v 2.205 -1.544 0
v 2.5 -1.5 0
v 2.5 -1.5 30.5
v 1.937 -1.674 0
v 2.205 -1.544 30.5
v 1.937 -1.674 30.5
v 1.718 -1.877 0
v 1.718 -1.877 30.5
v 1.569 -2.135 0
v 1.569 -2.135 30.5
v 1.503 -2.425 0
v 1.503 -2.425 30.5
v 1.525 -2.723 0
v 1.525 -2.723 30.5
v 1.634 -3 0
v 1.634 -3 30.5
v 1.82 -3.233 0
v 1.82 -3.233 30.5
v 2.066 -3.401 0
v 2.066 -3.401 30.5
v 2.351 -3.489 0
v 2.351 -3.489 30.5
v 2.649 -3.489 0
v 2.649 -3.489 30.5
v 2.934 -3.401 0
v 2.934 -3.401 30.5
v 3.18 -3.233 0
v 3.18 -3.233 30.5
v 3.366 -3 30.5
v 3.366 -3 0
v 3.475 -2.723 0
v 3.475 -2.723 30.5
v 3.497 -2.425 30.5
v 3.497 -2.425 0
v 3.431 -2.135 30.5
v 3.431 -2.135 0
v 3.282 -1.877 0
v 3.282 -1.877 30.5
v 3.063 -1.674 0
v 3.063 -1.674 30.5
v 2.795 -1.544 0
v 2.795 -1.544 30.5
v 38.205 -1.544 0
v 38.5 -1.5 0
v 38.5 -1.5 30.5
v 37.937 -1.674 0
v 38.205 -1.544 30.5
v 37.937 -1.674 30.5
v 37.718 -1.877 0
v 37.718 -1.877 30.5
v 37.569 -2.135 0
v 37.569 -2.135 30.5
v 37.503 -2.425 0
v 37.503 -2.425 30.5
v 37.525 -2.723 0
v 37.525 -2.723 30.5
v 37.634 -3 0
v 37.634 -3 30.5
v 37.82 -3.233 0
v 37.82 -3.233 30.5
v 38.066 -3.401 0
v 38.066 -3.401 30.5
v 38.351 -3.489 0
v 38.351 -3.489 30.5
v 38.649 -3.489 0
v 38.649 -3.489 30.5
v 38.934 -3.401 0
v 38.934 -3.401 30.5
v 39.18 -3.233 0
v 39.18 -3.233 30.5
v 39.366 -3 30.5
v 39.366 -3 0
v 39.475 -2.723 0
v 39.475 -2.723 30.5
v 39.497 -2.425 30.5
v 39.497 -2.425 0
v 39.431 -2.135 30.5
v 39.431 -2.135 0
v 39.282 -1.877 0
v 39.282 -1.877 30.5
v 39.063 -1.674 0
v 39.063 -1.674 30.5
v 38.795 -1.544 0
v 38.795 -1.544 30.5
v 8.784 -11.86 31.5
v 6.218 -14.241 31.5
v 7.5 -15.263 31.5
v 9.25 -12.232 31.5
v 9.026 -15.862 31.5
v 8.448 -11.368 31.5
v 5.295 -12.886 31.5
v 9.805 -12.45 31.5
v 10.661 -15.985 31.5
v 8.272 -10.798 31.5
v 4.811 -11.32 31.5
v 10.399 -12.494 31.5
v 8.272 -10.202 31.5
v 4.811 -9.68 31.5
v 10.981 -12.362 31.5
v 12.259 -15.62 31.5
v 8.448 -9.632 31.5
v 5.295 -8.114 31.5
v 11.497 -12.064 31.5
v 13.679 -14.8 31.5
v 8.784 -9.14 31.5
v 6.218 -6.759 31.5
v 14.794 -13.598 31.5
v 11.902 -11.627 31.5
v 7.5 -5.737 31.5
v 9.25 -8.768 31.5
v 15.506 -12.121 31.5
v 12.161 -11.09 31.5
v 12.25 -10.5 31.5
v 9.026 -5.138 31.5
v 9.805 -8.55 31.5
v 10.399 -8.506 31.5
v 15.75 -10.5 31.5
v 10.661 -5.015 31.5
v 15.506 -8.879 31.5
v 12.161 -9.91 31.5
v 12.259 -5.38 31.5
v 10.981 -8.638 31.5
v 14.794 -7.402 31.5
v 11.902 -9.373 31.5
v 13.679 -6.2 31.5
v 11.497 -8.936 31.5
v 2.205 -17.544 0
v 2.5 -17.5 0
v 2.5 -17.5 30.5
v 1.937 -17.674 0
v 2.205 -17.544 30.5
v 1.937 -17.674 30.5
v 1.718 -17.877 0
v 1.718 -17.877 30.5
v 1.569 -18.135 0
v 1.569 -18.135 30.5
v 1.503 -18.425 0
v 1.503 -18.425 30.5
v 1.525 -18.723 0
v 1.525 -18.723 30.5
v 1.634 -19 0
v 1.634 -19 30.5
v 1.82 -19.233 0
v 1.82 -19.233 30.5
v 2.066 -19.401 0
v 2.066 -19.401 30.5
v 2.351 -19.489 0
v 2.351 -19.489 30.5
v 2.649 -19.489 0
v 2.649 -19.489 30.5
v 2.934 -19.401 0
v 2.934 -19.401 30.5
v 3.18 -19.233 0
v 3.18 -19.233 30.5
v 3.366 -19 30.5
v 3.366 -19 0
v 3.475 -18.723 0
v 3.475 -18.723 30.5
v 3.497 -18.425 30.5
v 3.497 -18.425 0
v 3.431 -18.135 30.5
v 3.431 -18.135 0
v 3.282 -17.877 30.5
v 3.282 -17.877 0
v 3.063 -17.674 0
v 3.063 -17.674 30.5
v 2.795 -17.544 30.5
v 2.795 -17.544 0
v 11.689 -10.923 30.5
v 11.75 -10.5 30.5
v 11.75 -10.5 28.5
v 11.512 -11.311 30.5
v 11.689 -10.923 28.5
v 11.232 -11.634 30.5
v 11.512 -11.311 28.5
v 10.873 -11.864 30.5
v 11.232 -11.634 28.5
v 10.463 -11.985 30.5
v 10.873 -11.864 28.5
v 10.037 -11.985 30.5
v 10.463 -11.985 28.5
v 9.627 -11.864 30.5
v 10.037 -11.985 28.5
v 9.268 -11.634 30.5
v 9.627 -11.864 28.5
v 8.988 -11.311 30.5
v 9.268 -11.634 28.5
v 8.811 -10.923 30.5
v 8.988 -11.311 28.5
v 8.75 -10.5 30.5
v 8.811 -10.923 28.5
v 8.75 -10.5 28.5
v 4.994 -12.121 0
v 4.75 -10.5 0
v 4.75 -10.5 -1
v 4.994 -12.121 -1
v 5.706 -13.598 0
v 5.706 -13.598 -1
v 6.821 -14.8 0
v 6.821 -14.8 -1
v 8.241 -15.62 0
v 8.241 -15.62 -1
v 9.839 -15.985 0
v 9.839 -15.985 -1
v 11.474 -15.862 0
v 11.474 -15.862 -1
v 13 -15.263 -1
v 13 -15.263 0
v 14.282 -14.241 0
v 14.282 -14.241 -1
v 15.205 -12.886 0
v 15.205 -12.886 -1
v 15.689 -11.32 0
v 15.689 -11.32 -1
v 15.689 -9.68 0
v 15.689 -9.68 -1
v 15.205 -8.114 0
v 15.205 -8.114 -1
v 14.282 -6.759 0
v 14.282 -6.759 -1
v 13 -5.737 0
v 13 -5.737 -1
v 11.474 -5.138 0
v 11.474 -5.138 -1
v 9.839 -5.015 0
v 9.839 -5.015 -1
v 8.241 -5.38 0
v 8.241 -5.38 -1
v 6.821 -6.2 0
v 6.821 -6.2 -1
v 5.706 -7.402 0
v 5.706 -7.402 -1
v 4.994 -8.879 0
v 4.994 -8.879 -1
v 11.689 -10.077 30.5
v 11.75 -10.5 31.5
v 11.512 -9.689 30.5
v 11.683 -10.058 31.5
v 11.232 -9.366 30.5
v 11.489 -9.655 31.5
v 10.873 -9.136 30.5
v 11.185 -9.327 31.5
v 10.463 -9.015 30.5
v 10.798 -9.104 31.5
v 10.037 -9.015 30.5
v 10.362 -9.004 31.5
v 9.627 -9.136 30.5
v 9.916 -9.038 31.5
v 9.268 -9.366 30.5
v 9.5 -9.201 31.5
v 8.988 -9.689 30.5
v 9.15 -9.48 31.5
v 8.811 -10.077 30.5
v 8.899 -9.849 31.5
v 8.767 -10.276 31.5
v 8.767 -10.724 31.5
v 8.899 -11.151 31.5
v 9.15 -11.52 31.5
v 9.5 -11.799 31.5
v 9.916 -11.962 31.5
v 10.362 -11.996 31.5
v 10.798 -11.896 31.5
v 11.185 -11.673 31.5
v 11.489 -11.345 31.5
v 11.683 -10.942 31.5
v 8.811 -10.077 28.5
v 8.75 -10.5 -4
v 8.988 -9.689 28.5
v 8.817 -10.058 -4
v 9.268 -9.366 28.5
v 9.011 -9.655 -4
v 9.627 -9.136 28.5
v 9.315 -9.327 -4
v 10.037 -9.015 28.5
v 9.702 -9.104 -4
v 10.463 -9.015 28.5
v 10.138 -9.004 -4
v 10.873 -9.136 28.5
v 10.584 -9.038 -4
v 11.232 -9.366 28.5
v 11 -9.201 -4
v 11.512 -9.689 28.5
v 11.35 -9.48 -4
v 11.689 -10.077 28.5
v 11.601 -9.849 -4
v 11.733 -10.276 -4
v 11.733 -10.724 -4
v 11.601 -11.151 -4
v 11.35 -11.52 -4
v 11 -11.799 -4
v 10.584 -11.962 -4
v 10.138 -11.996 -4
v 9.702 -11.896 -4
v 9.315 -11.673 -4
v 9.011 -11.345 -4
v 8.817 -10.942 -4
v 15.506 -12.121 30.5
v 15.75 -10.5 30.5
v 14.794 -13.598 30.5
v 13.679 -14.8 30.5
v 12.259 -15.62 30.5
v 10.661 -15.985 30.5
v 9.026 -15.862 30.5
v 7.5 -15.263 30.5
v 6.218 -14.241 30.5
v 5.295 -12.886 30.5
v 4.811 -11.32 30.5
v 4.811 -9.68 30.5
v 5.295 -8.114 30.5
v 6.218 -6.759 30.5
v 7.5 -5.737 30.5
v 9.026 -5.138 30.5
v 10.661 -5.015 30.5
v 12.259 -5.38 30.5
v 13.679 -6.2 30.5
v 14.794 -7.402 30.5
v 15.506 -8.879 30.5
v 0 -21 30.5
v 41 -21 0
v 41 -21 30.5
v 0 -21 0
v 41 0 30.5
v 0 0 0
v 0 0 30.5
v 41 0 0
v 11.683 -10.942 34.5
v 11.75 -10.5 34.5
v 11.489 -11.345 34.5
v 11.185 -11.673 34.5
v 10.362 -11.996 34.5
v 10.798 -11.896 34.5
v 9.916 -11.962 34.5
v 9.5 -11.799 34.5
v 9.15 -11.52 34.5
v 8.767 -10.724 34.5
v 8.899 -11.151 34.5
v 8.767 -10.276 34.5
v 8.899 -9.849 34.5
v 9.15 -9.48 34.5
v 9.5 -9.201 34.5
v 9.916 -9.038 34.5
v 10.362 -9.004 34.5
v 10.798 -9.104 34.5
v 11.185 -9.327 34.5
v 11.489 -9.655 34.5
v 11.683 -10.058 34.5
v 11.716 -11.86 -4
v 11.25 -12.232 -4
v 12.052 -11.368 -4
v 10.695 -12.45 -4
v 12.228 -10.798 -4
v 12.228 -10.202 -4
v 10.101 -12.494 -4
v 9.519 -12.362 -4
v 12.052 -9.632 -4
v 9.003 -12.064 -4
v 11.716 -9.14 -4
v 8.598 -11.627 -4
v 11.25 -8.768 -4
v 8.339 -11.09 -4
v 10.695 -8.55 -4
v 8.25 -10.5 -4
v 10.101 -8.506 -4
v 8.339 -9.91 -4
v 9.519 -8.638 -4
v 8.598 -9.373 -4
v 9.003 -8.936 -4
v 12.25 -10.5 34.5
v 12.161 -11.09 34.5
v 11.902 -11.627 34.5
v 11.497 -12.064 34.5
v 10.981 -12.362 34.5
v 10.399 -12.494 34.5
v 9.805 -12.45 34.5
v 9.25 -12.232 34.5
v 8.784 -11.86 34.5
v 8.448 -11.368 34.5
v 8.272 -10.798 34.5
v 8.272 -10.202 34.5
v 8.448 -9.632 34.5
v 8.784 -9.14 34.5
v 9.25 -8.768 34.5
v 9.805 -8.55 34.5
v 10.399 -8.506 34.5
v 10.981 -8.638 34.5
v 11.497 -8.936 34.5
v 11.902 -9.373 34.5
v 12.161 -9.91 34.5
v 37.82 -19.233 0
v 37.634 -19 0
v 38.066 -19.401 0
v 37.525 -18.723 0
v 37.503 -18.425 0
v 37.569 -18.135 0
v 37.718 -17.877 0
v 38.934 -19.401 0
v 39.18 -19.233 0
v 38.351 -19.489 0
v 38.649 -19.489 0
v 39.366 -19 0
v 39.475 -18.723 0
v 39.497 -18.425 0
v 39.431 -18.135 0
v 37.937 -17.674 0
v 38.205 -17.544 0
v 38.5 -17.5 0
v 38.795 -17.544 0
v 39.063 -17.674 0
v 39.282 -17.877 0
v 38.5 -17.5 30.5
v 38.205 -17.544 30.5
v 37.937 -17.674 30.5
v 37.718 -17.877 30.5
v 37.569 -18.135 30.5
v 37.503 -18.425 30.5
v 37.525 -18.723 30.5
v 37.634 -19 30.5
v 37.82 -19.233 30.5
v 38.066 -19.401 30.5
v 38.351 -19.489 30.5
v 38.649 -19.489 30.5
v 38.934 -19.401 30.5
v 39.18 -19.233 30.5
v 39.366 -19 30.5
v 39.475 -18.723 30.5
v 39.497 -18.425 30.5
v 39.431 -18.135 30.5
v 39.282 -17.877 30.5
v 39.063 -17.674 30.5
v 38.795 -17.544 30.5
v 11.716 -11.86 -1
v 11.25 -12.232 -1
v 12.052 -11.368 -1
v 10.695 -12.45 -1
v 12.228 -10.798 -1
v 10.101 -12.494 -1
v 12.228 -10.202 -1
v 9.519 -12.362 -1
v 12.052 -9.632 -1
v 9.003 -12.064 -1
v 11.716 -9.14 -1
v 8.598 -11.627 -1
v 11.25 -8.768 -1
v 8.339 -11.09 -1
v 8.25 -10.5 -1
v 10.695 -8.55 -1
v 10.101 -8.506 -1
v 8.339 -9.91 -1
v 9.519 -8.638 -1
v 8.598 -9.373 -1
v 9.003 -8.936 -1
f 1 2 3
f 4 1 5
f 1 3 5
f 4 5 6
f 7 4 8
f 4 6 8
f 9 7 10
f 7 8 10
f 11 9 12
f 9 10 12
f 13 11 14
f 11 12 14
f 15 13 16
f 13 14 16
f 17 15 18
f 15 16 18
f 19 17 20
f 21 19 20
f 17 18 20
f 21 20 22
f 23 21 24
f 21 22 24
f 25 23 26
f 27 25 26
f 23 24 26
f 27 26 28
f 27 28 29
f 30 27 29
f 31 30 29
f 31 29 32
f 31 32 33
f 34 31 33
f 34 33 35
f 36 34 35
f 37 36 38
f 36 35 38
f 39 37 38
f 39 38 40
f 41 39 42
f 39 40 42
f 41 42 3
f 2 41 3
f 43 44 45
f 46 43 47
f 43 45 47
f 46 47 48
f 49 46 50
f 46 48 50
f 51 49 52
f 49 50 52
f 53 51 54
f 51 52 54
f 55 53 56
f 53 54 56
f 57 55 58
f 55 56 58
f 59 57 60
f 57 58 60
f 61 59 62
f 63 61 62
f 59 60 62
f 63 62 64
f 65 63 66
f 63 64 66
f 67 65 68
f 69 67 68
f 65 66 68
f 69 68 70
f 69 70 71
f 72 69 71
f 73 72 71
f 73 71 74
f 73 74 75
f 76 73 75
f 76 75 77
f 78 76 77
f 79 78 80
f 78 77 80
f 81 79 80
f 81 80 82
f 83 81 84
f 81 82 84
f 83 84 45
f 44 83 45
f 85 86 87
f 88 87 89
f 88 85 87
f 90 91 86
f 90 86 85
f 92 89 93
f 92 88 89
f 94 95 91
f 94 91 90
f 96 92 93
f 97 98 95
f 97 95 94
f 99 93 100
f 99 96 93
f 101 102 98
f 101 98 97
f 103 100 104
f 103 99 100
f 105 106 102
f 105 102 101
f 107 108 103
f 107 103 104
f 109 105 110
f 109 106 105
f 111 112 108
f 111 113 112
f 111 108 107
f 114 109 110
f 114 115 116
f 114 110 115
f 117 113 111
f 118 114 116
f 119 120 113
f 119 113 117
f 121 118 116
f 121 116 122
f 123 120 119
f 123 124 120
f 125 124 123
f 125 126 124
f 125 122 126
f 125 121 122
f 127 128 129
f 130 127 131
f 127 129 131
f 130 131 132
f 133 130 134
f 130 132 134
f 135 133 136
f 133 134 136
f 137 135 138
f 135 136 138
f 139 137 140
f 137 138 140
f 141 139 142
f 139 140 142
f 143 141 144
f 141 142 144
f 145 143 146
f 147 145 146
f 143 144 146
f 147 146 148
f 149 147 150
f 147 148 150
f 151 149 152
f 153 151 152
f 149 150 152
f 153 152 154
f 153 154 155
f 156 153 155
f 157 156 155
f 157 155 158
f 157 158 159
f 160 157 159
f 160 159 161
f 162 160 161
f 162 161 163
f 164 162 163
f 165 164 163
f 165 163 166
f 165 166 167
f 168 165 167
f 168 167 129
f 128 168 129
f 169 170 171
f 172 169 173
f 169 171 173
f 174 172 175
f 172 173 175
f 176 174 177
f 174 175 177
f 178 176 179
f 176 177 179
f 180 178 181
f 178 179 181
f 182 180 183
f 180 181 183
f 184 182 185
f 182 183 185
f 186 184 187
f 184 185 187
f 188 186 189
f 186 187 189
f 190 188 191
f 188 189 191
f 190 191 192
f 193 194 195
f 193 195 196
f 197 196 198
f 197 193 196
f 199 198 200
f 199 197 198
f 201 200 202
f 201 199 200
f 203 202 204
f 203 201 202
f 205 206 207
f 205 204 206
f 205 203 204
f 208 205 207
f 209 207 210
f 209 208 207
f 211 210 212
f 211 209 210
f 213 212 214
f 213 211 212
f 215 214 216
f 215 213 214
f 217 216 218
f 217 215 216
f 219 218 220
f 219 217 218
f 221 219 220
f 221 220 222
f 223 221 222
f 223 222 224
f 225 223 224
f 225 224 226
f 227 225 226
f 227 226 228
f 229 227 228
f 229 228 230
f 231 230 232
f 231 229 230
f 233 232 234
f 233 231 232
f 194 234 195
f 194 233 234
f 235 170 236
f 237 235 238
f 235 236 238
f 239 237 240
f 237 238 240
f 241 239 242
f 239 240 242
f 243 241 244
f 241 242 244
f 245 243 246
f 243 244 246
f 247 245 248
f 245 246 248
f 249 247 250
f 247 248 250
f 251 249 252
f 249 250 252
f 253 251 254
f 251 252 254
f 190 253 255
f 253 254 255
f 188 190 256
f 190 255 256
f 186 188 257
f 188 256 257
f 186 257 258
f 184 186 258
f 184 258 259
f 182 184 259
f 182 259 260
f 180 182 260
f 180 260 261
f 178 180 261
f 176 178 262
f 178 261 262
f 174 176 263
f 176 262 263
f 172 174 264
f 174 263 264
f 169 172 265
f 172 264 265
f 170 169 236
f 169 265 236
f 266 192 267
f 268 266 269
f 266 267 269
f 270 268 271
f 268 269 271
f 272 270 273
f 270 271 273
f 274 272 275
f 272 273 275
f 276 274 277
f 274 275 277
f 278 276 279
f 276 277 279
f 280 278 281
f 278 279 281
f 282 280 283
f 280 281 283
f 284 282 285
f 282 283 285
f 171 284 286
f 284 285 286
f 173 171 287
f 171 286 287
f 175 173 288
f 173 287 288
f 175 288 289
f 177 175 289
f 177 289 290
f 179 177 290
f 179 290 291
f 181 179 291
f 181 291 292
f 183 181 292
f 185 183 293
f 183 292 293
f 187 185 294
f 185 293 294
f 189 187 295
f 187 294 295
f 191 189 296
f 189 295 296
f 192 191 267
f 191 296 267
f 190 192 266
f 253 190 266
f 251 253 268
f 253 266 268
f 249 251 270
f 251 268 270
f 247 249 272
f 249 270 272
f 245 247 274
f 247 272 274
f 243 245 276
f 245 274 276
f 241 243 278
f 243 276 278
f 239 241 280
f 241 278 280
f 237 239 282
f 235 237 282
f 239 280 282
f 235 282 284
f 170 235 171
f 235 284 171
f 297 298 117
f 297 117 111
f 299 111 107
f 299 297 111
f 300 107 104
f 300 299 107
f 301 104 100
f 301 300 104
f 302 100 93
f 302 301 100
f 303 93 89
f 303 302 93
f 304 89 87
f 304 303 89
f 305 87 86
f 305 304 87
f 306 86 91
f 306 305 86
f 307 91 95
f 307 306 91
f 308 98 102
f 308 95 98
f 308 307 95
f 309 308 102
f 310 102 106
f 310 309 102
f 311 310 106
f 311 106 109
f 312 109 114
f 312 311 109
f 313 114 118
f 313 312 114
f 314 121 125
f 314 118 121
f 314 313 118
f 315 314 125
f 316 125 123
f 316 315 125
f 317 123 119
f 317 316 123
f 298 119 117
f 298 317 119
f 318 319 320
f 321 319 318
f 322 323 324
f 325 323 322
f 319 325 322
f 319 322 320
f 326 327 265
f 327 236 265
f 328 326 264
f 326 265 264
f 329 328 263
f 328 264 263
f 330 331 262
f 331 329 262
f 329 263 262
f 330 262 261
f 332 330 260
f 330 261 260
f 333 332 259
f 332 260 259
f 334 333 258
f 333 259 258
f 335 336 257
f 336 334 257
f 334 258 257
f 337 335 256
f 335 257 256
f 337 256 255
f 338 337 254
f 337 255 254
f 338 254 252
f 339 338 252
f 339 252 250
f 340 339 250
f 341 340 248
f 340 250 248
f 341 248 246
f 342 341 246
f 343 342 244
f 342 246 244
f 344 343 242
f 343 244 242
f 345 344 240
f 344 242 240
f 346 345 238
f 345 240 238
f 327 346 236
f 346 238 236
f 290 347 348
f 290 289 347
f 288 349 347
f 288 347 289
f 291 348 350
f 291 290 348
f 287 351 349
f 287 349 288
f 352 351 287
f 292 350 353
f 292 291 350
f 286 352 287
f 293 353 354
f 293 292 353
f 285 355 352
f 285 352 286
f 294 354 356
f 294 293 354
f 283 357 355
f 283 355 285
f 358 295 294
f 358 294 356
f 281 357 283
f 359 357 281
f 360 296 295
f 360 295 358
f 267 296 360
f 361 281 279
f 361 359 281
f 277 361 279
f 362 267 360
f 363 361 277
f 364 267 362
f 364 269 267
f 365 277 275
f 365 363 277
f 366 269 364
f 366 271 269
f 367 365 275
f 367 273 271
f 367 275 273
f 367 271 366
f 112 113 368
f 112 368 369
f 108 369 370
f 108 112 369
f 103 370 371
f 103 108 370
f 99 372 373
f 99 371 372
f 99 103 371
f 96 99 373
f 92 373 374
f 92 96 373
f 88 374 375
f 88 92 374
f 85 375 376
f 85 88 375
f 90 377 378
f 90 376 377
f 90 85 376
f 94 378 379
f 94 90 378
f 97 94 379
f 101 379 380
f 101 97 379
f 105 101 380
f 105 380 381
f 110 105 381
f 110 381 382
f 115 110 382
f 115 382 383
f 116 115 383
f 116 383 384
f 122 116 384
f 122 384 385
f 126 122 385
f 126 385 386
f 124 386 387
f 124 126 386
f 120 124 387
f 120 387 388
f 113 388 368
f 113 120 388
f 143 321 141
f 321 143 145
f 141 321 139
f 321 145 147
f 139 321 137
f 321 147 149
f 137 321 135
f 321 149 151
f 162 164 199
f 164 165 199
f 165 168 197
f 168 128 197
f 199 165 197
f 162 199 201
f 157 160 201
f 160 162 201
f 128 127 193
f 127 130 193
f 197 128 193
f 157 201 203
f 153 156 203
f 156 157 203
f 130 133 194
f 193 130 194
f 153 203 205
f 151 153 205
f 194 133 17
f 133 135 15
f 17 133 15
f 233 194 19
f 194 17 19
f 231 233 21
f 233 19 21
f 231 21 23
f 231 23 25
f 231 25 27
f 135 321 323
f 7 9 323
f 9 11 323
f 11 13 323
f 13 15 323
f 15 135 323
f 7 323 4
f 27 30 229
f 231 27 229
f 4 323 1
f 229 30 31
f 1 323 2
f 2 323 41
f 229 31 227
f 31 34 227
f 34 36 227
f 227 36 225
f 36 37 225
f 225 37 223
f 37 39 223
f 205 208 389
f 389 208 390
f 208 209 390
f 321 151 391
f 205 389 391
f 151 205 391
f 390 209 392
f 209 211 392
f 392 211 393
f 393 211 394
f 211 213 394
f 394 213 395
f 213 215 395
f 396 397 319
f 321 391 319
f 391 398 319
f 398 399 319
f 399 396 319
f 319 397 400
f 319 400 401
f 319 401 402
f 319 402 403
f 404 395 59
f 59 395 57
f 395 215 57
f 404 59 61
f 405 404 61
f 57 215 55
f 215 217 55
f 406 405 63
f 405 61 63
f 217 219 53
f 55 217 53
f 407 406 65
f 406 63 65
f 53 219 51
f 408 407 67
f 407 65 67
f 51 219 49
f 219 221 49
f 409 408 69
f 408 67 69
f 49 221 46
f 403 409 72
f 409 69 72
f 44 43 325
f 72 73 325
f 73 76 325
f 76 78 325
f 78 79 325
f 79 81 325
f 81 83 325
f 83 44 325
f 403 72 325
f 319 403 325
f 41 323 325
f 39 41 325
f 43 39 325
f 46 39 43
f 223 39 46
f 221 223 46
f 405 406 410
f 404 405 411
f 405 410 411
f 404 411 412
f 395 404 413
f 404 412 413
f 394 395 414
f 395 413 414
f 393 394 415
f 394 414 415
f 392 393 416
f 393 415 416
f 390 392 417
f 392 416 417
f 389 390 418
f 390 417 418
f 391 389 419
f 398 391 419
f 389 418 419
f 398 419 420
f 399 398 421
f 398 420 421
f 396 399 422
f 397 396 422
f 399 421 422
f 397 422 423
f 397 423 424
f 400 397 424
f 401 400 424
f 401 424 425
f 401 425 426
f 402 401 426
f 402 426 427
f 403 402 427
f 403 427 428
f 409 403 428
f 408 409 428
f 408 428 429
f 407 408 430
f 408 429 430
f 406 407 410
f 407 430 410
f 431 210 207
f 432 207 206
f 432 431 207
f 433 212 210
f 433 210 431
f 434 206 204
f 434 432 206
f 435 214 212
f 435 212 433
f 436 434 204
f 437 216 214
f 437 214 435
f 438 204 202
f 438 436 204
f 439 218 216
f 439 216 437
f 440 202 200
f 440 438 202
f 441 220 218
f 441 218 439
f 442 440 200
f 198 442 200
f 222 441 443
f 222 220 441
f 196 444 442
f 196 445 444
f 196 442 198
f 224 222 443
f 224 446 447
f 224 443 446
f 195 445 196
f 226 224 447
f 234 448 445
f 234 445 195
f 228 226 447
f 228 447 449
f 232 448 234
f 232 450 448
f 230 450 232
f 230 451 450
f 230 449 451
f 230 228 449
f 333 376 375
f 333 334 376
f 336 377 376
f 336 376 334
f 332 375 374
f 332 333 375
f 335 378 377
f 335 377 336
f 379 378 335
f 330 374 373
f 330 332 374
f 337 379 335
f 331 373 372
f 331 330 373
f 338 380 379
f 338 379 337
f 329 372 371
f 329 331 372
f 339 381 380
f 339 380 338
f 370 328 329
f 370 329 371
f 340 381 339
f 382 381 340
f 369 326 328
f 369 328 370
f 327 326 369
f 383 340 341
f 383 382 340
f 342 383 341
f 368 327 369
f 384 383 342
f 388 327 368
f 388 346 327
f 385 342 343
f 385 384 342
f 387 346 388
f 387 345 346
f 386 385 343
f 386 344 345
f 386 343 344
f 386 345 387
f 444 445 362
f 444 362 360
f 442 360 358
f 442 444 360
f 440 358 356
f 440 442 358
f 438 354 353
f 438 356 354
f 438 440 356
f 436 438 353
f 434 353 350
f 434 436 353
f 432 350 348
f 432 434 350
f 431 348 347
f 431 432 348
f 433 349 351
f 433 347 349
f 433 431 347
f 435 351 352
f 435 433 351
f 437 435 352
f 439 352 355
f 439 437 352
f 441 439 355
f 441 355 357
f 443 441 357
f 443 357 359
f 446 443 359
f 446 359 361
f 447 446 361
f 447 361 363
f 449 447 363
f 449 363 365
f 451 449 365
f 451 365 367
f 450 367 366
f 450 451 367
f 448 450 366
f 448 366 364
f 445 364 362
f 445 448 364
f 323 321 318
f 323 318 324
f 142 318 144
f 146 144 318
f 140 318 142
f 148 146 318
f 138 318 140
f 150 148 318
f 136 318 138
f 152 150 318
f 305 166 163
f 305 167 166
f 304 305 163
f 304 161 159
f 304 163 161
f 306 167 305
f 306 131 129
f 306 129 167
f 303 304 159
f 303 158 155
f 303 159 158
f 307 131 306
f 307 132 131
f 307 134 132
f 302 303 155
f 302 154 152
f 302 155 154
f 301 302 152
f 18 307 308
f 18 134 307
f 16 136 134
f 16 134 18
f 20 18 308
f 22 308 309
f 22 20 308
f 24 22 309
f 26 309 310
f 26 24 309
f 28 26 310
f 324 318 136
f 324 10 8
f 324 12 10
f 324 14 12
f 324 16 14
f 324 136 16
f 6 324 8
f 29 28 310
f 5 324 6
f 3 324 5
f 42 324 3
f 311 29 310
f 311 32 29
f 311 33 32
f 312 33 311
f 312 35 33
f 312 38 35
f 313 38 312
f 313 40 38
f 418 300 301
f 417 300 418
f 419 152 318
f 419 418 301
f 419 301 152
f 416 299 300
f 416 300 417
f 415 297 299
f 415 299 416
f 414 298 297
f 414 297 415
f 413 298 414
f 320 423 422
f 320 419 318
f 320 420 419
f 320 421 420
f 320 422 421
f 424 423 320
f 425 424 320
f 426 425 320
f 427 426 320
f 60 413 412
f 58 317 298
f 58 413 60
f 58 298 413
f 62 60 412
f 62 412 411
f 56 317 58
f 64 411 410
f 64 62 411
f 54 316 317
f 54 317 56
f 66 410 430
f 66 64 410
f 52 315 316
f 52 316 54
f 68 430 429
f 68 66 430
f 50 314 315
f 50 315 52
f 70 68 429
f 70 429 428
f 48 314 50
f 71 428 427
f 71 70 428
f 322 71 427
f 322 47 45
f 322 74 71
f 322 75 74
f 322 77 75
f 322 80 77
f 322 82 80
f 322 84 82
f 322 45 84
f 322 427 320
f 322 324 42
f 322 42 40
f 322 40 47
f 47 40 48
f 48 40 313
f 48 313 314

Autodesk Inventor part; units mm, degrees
ref_plane "YZ Plane" through (0, 0, 0) normal (1, 0, 0) x (0, 1, 0)
ref_plane "XZ Plane" through (0, 0, 0) normal (0, 1, 0) x (-1, 0, 0)
ref_plane "XY Plane" through (0, 0, 0) normal (0, 0, 1) x (1, 0, 0)
sketch "スケッチ1" plane through (0, 0, 0) normal (0, 0, 1) x (1, 0, 0)
  line L0 (0, 0) -> (41, 0)
  line L1 (41, 0) -> (41, -21)
  line L2 (41, -21) -> (0, -21)
  line L3 (0, -21) -> (0, 0)
  dimension "d0" = 41
  dimension "d1" = 21
extrude "押し出し1" add sketch "スケッチ1" along normal blind 30.5
sketch "スケッチ2" plane through (0, 0, 0) normal (0, 0, -1) x (-1, 0, 0)
  line L0 (0, 0) -> (-41, 0) projected
  line L1 (0, -21) -> (0, 0) projected
  line L2 (-41, 0) -> (-41, -21) projected
  line L3 (0, -21) -> (-41, -21) projected
  point P0 (-2.5, -2.5)
  point P1 (-38.5, -2.5)
  point P2 (-2.5, -18.5)
  point P3 (-38.5, -18.5)
  dimension "d32" = 16
  dimension "d33" = 2.5
  dimension "d34" = 36
  dimension "d35" = 2.5
  dimension "d36" = 2.5
  dimension "d37" = 36
  dimension "d39" = 16
  dimension "d40" = 2.5
hole "穴1" at (2.5, -2.5, 0) at (38.5, -2.5, 0) at (2.5, -18.5, 0) at (38.5, -18.5, 0) direction (0, 0, 1) diameter 2 end through all
sketch "スケッチ3" plane through (0, 0, 0) normal (0, 0, -1) x (-1, 0, 0)
  circle A0 centre (-10.25, -10.5) radius 5.5
  point P0 (0, 0)
  dimension "d11" = 11
extrude "押し出し2" add sketch "スケッチ3" along normal blind 1
sketch "スケッチ4" plane through (10.25, -10.5, -1) normal (0, 0, -1) x (-1, 0, 0)
  circle A0 centre (0, 0) radius 1.5
  point P0 (10.25, 10.5)
  dimension "d14" = 3
extrude "押し出し3" cut sketch "スケッチ4" against normal blind 40
sketch "スケッチ5" plane through (10.25, -10.5, -1) normal (0, 0, -1) x (-1, 0, 0)
  circle A0 centre (0, 0) radius 2
  point P0 (10.25, 10.5)
  dimension "d17" = 4
extrude "押し出し4" add sketch "スケッチ5" along normal blind 3
sketch "スケッチ6" plane through (10.25, -10.5, -4) normal (0, 0, -1) x (-1, 0, 0)
  circle A0 centre (0, 0) radius 1.5
  point P0 (10.25, 10.5)
  dimension "d20" = 3
extrude "押し出し5" cut sketch "スケッチ6" against normal blind 4
sketch "スケッチ8" plane through (0, 0, 30.5) normal (0, 0, 1) x (1, 0, 0)
  circle A0 centre (10.25, -10.5) radius 5.5
  point P0 (0, 0)
  dimension "d23" = 11
extrude "押し出し6" add sketch "スケッチ8" along normal blind 1
sketch "スケッチ9" plane through (10.25, -10.5, 31.5) normal (0, 0, 1) x (1, 0, 0)
  circle A0 centre (0, 0) radius 1.5 projected
  circle A1 centre (0, 0) radius 2
  point P0 (-10.25, 10.5)
  dimension "d26" = 4
extrude "押し出し7" add sketch "スケッチ9" along normal blind 3
sketch "スケッチ10" plane through (10.25, -10.5, 31.5) normal (0, 0, 1) x (1, 0, 0)
  circle A0 centre (0, 0) radius 1.5
  point P0 (-10.25, 10.5)
  dimension "d29" = 3
extrude "押し出し8" cut sketch "スケッチ10" against normal blind 3
properties part number "KRS-2542HV ICS" material "PVC、軟質"
